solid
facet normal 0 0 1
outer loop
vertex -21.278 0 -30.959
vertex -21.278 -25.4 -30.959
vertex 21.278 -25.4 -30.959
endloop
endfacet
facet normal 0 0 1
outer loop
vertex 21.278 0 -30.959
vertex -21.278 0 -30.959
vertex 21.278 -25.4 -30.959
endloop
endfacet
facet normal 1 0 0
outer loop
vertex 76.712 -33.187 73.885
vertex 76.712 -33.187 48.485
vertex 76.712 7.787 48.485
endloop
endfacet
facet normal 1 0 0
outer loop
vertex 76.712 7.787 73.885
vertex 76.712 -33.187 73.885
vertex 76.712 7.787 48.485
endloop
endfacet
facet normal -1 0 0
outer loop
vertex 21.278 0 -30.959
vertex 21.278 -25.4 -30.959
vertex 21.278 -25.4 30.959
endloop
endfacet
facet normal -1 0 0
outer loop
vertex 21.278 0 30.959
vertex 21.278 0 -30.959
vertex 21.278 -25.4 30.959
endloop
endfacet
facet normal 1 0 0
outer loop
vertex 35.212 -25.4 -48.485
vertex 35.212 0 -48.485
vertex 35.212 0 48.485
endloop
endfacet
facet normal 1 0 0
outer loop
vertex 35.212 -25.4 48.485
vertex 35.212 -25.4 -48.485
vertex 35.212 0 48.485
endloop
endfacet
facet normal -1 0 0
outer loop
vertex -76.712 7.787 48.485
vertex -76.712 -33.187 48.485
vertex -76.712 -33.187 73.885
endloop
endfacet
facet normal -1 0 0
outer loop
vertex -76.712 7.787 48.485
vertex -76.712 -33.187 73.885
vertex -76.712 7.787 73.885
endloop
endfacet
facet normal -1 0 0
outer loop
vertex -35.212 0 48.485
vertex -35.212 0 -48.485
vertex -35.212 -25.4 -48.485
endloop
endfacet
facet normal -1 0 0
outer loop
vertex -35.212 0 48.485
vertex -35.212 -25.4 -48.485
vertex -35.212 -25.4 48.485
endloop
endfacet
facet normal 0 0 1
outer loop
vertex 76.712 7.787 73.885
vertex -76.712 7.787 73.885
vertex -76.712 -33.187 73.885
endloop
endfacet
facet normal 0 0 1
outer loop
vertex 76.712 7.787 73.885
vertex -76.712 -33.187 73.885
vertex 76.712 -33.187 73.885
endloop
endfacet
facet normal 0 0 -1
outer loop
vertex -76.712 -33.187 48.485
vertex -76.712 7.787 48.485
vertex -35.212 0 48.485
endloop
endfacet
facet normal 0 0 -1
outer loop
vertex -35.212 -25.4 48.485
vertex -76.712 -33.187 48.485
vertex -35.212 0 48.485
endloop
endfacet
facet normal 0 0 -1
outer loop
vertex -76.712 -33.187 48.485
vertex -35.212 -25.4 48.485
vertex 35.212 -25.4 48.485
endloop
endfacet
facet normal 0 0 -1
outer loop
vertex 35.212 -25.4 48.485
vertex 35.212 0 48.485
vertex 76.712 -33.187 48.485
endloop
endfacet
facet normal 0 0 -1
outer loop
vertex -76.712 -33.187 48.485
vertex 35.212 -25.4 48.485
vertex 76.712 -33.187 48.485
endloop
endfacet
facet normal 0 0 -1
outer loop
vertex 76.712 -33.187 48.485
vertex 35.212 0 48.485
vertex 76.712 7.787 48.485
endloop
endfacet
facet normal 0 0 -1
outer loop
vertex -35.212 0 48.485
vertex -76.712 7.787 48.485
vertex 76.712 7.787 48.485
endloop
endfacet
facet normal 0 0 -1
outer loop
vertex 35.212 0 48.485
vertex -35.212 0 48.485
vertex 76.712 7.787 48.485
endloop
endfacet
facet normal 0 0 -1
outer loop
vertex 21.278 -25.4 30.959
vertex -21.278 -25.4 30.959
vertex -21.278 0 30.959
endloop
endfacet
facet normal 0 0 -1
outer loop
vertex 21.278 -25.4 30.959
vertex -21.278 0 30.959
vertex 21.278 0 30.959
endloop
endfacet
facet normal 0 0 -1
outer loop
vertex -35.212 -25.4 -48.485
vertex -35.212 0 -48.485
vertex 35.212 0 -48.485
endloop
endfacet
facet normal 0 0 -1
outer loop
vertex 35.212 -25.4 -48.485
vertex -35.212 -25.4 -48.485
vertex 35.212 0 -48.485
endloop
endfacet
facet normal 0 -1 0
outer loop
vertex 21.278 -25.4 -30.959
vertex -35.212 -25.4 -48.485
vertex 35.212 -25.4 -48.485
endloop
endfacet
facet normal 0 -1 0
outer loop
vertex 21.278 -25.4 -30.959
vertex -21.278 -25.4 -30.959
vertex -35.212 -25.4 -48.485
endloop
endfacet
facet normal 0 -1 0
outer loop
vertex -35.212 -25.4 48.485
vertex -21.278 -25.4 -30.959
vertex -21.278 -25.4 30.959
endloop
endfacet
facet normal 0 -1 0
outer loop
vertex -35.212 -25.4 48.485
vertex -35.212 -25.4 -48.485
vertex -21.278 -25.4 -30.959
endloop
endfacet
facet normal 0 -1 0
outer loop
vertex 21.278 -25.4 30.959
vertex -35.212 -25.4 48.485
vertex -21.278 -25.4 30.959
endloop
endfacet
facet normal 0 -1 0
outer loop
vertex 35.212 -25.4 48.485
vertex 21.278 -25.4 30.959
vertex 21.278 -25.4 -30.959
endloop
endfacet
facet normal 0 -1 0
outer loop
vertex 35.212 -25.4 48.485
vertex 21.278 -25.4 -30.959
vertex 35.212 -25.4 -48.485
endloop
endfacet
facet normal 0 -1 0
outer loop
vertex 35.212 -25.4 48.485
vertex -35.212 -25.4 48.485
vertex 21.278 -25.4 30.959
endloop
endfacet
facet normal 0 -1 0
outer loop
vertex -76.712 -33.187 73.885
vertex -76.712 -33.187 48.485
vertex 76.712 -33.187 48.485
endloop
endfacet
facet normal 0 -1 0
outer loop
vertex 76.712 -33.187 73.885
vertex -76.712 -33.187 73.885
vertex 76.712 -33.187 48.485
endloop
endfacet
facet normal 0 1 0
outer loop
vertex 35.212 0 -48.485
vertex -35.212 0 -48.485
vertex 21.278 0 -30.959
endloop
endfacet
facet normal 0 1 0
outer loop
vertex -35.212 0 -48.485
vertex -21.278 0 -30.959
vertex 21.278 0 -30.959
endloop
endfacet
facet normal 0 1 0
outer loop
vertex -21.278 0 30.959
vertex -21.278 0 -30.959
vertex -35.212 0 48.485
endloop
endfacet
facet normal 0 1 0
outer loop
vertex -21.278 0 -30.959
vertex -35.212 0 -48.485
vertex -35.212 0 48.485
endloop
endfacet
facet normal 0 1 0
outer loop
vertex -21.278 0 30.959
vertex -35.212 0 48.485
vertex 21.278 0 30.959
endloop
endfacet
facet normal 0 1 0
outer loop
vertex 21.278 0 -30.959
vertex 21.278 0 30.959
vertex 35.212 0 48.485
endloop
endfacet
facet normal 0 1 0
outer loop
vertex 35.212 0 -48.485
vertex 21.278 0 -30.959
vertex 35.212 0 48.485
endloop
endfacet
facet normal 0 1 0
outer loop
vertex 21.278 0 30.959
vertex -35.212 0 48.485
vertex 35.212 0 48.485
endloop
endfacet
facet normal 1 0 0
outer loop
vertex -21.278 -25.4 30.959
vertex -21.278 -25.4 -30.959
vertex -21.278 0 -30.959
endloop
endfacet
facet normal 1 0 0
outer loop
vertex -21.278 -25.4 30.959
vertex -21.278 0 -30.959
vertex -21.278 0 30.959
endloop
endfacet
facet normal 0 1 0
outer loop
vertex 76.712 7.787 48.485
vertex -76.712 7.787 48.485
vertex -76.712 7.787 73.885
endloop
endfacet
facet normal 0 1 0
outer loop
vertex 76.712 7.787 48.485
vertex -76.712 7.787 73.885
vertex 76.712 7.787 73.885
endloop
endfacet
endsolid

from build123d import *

# Parameters (mm, degrees)
F0_W     = 70.4235509038
F0_H     = 96.9706401229
F1_DEPTH = 25.4
F2_W     = 153.4230113029
F2_H     = 40.9747579411
F2_W_2   = 70.4235509038
F2_H_2   = 25.4
F3_DEPTH = 25.4
F4_W     = 42.5563007593
F4_H     = 61.9181990623
F5_DEPTH = 25.4


with BuildPart() as f1:
    # F0 (on Front) → F1 (new body)
    with BuildSketch(Plane.XZ):
        Rectangle(F0_W, F0_H)
    extrude(amount=F1_DEPTH)

    # F2 (on face) → F3 (join)
    with BuildSketch(Plane.XY.offset(48.4853200614)):
        with Locations((0, -12.7)):
            Rectangle(F2_W, F2_H)
        with Locations((0, -12.7)):
            Rectangle(F2_W_2, F2_H_2, mode=Mode.SUBTRACT)
        with Locations((0, -12.7)):
            Rectangle(F2_W_2, F2_H_2)
    extrude(amount=F3_DEPTH)

    # F4 (on face) → F5 (cut)
    with BuildSketch(Plane.XZ.offset(25.4)):
        Rectangle(F4_W, F4_H)
    extrude(amount=-F5_DEPTH, mode=Mode.SUBTRACT)


solid = f1.part
